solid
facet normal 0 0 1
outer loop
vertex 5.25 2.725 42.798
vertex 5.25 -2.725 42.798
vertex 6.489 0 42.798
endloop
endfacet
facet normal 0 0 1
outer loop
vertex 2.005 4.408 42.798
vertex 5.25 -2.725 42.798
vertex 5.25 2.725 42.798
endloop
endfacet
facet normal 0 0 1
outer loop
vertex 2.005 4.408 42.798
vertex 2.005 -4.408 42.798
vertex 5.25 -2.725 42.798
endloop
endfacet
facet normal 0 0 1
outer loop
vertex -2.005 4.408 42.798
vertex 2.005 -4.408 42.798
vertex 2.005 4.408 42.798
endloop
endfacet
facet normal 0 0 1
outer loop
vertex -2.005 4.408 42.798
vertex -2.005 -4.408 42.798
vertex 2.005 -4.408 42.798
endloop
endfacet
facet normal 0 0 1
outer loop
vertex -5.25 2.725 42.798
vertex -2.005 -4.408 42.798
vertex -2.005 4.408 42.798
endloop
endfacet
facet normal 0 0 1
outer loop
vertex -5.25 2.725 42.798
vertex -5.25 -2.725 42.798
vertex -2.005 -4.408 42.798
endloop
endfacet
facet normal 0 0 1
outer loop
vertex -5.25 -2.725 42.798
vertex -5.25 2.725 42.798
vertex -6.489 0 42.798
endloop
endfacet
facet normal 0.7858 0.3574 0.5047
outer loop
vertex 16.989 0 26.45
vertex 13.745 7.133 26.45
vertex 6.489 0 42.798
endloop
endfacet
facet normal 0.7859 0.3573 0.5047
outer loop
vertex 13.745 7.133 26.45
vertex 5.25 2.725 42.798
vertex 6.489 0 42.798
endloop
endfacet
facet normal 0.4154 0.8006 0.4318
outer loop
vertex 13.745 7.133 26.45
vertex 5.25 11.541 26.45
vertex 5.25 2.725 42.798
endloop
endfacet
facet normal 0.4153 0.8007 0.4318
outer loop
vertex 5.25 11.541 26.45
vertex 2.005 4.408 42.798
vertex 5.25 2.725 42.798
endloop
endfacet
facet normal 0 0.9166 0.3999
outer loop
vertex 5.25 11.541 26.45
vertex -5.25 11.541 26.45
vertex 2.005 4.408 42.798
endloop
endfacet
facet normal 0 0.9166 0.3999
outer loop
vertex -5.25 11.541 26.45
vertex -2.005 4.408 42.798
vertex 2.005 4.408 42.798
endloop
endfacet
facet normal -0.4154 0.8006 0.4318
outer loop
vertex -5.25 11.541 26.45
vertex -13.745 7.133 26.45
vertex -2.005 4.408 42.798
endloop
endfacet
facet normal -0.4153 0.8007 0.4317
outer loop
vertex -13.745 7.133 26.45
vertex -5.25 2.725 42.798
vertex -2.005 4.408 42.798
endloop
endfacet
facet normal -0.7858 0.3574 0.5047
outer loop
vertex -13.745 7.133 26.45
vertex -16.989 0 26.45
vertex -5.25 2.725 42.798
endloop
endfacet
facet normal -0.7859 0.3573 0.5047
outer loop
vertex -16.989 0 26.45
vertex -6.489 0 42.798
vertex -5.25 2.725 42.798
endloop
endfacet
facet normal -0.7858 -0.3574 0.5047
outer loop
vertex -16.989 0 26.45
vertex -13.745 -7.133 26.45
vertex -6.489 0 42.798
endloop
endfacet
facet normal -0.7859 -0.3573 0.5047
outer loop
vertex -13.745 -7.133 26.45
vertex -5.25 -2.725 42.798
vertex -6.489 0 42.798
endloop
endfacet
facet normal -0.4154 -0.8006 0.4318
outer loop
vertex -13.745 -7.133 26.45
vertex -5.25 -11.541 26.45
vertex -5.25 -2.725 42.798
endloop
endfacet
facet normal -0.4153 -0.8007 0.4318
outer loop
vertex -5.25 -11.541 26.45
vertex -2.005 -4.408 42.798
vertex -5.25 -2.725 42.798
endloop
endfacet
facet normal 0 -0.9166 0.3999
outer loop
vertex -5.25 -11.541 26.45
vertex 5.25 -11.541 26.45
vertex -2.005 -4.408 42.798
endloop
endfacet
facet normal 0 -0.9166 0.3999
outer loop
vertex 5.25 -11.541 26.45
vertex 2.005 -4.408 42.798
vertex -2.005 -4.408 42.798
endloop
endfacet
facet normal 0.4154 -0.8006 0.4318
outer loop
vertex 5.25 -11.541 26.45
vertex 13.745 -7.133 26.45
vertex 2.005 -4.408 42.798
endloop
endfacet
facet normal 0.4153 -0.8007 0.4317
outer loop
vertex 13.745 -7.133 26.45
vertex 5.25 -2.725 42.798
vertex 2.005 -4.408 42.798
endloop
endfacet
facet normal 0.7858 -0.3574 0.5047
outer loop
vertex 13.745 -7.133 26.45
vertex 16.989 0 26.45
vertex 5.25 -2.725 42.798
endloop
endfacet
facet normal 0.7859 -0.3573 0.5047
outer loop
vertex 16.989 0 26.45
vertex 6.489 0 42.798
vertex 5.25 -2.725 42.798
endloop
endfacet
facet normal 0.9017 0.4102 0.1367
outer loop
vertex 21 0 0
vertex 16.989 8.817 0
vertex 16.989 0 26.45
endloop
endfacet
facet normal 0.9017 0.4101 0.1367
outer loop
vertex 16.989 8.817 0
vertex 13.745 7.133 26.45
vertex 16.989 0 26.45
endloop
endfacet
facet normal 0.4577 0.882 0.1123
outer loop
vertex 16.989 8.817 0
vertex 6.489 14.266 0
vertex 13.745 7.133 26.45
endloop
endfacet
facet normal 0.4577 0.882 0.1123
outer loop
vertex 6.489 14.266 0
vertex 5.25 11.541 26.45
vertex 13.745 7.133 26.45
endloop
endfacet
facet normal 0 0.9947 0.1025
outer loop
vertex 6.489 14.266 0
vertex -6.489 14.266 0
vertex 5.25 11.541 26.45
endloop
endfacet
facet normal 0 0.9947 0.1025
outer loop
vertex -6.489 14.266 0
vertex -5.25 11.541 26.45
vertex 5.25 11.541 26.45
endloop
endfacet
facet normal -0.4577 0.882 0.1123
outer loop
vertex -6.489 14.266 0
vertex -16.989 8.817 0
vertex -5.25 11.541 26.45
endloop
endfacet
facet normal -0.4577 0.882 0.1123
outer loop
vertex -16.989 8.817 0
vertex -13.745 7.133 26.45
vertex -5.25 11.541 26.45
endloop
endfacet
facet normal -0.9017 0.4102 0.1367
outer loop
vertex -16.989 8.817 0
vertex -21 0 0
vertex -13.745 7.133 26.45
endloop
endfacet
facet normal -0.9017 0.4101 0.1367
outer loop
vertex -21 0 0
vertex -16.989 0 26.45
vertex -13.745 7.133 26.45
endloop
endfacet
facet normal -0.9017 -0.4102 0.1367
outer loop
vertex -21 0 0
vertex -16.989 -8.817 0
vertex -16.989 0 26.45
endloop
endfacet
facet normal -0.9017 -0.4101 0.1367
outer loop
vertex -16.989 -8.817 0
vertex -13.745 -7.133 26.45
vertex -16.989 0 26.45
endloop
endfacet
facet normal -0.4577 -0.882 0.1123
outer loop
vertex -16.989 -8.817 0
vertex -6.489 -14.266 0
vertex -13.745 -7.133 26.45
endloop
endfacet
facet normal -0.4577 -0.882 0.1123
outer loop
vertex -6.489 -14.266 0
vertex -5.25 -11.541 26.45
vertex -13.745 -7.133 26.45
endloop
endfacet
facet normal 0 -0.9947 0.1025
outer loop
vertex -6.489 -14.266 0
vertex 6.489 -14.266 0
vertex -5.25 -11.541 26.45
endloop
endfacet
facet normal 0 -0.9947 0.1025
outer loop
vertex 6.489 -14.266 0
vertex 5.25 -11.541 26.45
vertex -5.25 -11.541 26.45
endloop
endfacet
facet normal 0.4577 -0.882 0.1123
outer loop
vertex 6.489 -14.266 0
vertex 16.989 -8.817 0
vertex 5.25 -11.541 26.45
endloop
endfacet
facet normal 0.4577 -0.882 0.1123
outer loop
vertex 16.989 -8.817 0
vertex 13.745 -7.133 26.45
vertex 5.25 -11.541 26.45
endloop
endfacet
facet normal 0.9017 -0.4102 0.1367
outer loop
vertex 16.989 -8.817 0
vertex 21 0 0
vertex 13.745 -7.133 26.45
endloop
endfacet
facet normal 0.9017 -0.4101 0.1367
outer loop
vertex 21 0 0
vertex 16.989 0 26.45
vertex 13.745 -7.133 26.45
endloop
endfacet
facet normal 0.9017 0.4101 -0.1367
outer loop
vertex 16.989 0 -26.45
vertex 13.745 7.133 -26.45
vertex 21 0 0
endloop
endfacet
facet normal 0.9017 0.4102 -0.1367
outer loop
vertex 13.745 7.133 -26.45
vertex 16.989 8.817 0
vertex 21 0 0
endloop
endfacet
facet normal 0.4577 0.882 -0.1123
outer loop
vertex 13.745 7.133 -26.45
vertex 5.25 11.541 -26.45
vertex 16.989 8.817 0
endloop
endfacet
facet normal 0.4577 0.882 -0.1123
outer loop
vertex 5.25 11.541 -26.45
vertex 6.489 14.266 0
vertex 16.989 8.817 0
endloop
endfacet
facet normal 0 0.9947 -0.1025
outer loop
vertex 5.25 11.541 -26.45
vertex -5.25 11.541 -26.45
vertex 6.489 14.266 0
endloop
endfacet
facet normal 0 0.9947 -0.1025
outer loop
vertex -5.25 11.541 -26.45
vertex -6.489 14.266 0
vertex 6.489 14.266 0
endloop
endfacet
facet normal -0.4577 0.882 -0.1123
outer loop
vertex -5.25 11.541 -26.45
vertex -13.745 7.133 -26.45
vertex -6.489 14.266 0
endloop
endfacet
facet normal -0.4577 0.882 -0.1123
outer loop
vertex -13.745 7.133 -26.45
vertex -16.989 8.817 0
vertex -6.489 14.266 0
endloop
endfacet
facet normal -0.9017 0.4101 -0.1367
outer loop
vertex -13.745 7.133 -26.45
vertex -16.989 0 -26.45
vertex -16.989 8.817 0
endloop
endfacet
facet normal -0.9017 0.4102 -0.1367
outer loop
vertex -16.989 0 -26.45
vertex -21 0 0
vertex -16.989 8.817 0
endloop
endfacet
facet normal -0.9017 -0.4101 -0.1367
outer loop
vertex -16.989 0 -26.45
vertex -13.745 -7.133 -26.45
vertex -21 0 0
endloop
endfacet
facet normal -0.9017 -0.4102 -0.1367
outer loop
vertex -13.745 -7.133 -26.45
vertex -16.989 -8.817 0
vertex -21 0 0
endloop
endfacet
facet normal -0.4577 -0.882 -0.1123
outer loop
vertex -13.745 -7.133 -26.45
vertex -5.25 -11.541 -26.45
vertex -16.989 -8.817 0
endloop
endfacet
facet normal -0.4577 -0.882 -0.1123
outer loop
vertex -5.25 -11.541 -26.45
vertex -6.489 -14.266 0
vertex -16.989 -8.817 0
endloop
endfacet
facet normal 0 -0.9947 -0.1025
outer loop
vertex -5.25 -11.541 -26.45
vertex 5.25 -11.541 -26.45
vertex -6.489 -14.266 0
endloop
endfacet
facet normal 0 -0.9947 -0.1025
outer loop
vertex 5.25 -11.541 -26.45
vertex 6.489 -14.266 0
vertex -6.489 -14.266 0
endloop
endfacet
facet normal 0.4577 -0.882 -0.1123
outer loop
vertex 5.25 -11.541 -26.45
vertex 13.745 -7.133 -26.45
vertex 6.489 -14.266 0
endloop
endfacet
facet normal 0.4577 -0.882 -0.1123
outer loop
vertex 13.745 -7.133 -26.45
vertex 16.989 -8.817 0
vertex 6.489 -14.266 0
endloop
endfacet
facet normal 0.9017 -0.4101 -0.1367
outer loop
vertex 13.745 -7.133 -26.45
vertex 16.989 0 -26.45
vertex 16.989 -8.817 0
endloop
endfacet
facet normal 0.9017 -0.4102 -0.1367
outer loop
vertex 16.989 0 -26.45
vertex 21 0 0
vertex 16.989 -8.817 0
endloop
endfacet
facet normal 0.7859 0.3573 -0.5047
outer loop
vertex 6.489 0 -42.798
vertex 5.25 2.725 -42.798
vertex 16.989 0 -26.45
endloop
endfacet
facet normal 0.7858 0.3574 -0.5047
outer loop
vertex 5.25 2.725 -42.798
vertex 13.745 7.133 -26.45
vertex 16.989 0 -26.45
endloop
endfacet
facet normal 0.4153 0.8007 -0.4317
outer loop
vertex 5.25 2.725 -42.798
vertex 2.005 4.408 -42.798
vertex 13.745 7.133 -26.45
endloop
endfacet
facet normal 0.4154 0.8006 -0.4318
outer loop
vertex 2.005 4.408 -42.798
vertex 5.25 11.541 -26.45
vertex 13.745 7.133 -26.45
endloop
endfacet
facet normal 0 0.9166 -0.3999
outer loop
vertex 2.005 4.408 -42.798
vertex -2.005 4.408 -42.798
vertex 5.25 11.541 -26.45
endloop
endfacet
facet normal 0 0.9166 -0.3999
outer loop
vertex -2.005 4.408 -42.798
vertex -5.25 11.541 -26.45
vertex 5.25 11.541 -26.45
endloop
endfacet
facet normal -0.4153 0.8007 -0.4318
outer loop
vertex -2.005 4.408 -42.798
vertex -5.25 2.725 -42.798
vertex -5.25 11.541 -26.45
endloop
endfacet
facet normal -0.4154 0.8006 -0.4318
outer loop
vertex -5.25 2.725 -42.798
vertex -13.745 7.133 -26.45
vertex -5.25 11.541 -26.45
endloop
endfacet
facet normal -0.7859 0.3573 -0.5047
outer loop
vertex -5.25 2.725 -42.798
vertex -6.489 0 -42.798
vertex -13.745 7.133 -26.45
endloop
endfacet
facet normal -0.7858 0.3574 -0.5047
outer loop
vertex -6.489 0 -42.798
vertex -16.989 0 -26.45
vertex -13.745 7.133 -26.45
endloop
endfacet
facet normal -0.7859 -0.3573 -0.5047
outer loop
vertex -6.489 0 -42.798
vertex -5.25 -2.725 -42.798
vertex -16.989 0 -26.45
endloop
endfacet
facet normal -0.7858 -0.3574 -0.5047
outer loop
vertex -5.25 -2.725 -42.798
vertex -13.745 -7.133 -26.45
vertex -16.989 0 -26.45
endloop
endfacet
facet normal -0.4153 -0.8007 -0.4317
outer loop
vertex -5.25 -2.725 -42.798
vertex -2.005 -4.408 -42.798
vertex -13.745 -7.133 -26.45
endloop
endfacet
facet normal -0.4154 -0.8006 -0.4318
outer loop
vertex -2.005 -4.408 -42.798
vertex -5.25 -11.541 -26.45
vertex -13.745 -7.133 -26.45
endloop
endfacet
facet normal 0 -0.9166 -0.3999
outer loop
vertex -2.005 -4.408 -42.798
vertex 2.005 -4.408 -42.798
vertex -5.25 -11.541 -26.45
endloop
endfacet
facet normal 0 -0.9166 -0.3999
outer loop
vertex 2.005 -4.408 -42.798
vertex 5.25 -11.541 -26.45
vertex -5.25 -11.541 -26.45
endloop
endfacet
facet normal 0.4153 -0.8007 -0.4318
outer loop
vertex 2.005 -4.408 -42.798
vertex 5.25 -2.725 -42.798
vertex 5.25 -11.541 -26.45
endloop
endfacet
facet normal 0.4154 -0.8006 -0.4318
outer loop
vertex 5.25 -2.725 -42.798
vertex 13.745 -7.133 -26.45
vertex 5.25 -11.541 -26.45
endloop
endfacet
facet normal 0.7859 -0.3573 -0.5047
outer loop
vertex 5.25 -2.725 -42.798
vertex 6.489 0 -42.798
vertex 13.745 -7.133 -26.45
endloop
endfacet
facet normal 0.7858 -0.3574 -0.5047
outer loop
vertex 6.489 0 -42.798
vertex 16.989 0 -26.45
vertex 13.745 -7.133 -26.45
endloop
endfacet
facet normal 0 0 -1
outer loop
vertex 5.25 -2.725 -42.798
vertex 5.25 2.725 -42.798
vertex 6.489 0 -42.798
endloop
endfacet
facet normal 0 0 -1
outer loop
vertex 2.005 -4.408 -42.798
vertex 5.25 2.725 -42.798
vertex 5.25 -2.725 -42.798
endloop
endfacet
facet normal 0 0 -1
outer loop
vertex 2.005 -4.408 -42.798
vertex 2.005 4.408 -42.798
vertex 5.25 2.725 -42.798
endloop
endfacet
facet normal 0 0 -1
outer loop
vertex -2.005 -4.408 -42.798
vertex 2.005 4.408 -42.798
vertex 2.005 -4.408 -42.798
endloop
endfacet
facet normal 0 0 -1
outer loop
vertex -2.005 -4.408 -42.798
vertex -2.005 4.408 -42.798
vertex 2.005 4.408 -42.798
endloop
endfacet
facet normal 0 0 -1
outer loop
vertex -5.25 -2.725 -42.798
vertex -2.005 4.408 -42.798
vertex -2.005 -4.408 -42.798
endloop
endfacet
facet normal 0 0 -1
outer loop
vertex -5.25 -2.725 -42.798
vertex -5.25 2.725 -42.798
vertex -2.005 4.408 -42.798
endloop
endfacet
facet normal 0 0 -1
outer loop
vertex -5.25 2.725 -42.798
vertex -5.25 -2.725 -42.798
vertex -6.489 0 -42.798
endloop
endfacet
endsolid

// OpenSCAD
// Generated by SolidPython 1.0.1 on 2020-07-29 00:46:47


scale(v = [7, 5, 15]) {
	sphere(r = 3);
}
/***********************************************
*********      SolidPython code:      **********
************************************************
 
# import packages: SolidPython
from solid import *
from solid.utils import *
from itertools import chain, combinations, permutations


class Resize:

    def __init__(self, scad_file):
        self.scad_file = scad_file
        #self.scad_file = import_scad(scad_file)
        # cone/cylinder param:
        self.r1 = 0
        self.r2 = 0
        self.h = 0
        # rectangular prism param:
        self.w = 0
        self.l = 0
        # ellipse param:
        self.r = 0

    # import OpenScad code (file name corresponds to shape)


    # classify shape + parameters
    def assign(self, param1, param2, param3):
        if self.scad_file == 'cone.scad':
            self.r1 = param1
            self.r2 = param2
            self.h = param3
        elif self.scad_file == 'cylinder.scad':
            self.r1 = param1
            self.r2 = param2
            self.h = param3
        elif self.scad_file == 'rectangularPrism.scad':
            self.h = param1
            self.l = param2
            self.w = param3
        else:
            self.r = param1
            self.h = param2

    # resize parameters
    def iterate(self):
        x = range(3, 20, 2)
        i = 1
        if self.scad_file == 'cone.scad':
            tempList = list(permutations(x, 2))
            for temp in tempList:
                param1 = temp[0]
                param2 = temp[1]
                filepath = 'produced_scad_files/' + 'cone' + str(param1) + '_' + str(param2) + '_' + '.scad'
                scad_render_to_file(cylinder(h=param1, r1=param2, r2=0), filepath)

        elif self.scad_file == 'cylinder.scad':
            tempList = list(permutations(x, 3))
            for temp in tempList:
                param1 = temp[0]
                param2 = temp[1]
                filepath = 'produced_scad_files/' + 'cylinder' + str(param1) + '_' + str(param2) + '_' + '.scad'
                scad_render_to_file(cylinder(h=param1, r1=param2, r2=param2), filepath)

        elif self.scad_file == 'rectangularPrism.scad':
            tempList = list(permutations(x, 3))
            for temp in tempList:
                param1 = temp[0]
                param2 = temp[1]
                param3 = temp[2]
                filepath = 'produced_scad_files/' + 'rectangularPrism' + str(param1) + '_' + str(param2) + '_' + str(
                    param3) + '.scad'
                scad_render_to_file(cube(size=(param1, param2, param3)), filepath)

        elif self.scad_file == 'ellipse.scad':
            tempList = list(permutations(x, 4))
            for temp in tempList:
                param1 = temp[0]
                param2 = temp[1]
                param3 = temp[2]
                param4 = temp[3]
                filepath = 'produced_scad_files/' + 'ellipse' + str(param1) + '_' + str(param2) + '_' + str(param3) + '_' + str(param4) + '.scad'
                scad_render_to_file(scale([param1, param2, param3])(sphere(r=param4)), filepath)

    def render_to_scadfile(self):
        scad_render_to_file(scad, 'example.scad') 
 
************************************************/
